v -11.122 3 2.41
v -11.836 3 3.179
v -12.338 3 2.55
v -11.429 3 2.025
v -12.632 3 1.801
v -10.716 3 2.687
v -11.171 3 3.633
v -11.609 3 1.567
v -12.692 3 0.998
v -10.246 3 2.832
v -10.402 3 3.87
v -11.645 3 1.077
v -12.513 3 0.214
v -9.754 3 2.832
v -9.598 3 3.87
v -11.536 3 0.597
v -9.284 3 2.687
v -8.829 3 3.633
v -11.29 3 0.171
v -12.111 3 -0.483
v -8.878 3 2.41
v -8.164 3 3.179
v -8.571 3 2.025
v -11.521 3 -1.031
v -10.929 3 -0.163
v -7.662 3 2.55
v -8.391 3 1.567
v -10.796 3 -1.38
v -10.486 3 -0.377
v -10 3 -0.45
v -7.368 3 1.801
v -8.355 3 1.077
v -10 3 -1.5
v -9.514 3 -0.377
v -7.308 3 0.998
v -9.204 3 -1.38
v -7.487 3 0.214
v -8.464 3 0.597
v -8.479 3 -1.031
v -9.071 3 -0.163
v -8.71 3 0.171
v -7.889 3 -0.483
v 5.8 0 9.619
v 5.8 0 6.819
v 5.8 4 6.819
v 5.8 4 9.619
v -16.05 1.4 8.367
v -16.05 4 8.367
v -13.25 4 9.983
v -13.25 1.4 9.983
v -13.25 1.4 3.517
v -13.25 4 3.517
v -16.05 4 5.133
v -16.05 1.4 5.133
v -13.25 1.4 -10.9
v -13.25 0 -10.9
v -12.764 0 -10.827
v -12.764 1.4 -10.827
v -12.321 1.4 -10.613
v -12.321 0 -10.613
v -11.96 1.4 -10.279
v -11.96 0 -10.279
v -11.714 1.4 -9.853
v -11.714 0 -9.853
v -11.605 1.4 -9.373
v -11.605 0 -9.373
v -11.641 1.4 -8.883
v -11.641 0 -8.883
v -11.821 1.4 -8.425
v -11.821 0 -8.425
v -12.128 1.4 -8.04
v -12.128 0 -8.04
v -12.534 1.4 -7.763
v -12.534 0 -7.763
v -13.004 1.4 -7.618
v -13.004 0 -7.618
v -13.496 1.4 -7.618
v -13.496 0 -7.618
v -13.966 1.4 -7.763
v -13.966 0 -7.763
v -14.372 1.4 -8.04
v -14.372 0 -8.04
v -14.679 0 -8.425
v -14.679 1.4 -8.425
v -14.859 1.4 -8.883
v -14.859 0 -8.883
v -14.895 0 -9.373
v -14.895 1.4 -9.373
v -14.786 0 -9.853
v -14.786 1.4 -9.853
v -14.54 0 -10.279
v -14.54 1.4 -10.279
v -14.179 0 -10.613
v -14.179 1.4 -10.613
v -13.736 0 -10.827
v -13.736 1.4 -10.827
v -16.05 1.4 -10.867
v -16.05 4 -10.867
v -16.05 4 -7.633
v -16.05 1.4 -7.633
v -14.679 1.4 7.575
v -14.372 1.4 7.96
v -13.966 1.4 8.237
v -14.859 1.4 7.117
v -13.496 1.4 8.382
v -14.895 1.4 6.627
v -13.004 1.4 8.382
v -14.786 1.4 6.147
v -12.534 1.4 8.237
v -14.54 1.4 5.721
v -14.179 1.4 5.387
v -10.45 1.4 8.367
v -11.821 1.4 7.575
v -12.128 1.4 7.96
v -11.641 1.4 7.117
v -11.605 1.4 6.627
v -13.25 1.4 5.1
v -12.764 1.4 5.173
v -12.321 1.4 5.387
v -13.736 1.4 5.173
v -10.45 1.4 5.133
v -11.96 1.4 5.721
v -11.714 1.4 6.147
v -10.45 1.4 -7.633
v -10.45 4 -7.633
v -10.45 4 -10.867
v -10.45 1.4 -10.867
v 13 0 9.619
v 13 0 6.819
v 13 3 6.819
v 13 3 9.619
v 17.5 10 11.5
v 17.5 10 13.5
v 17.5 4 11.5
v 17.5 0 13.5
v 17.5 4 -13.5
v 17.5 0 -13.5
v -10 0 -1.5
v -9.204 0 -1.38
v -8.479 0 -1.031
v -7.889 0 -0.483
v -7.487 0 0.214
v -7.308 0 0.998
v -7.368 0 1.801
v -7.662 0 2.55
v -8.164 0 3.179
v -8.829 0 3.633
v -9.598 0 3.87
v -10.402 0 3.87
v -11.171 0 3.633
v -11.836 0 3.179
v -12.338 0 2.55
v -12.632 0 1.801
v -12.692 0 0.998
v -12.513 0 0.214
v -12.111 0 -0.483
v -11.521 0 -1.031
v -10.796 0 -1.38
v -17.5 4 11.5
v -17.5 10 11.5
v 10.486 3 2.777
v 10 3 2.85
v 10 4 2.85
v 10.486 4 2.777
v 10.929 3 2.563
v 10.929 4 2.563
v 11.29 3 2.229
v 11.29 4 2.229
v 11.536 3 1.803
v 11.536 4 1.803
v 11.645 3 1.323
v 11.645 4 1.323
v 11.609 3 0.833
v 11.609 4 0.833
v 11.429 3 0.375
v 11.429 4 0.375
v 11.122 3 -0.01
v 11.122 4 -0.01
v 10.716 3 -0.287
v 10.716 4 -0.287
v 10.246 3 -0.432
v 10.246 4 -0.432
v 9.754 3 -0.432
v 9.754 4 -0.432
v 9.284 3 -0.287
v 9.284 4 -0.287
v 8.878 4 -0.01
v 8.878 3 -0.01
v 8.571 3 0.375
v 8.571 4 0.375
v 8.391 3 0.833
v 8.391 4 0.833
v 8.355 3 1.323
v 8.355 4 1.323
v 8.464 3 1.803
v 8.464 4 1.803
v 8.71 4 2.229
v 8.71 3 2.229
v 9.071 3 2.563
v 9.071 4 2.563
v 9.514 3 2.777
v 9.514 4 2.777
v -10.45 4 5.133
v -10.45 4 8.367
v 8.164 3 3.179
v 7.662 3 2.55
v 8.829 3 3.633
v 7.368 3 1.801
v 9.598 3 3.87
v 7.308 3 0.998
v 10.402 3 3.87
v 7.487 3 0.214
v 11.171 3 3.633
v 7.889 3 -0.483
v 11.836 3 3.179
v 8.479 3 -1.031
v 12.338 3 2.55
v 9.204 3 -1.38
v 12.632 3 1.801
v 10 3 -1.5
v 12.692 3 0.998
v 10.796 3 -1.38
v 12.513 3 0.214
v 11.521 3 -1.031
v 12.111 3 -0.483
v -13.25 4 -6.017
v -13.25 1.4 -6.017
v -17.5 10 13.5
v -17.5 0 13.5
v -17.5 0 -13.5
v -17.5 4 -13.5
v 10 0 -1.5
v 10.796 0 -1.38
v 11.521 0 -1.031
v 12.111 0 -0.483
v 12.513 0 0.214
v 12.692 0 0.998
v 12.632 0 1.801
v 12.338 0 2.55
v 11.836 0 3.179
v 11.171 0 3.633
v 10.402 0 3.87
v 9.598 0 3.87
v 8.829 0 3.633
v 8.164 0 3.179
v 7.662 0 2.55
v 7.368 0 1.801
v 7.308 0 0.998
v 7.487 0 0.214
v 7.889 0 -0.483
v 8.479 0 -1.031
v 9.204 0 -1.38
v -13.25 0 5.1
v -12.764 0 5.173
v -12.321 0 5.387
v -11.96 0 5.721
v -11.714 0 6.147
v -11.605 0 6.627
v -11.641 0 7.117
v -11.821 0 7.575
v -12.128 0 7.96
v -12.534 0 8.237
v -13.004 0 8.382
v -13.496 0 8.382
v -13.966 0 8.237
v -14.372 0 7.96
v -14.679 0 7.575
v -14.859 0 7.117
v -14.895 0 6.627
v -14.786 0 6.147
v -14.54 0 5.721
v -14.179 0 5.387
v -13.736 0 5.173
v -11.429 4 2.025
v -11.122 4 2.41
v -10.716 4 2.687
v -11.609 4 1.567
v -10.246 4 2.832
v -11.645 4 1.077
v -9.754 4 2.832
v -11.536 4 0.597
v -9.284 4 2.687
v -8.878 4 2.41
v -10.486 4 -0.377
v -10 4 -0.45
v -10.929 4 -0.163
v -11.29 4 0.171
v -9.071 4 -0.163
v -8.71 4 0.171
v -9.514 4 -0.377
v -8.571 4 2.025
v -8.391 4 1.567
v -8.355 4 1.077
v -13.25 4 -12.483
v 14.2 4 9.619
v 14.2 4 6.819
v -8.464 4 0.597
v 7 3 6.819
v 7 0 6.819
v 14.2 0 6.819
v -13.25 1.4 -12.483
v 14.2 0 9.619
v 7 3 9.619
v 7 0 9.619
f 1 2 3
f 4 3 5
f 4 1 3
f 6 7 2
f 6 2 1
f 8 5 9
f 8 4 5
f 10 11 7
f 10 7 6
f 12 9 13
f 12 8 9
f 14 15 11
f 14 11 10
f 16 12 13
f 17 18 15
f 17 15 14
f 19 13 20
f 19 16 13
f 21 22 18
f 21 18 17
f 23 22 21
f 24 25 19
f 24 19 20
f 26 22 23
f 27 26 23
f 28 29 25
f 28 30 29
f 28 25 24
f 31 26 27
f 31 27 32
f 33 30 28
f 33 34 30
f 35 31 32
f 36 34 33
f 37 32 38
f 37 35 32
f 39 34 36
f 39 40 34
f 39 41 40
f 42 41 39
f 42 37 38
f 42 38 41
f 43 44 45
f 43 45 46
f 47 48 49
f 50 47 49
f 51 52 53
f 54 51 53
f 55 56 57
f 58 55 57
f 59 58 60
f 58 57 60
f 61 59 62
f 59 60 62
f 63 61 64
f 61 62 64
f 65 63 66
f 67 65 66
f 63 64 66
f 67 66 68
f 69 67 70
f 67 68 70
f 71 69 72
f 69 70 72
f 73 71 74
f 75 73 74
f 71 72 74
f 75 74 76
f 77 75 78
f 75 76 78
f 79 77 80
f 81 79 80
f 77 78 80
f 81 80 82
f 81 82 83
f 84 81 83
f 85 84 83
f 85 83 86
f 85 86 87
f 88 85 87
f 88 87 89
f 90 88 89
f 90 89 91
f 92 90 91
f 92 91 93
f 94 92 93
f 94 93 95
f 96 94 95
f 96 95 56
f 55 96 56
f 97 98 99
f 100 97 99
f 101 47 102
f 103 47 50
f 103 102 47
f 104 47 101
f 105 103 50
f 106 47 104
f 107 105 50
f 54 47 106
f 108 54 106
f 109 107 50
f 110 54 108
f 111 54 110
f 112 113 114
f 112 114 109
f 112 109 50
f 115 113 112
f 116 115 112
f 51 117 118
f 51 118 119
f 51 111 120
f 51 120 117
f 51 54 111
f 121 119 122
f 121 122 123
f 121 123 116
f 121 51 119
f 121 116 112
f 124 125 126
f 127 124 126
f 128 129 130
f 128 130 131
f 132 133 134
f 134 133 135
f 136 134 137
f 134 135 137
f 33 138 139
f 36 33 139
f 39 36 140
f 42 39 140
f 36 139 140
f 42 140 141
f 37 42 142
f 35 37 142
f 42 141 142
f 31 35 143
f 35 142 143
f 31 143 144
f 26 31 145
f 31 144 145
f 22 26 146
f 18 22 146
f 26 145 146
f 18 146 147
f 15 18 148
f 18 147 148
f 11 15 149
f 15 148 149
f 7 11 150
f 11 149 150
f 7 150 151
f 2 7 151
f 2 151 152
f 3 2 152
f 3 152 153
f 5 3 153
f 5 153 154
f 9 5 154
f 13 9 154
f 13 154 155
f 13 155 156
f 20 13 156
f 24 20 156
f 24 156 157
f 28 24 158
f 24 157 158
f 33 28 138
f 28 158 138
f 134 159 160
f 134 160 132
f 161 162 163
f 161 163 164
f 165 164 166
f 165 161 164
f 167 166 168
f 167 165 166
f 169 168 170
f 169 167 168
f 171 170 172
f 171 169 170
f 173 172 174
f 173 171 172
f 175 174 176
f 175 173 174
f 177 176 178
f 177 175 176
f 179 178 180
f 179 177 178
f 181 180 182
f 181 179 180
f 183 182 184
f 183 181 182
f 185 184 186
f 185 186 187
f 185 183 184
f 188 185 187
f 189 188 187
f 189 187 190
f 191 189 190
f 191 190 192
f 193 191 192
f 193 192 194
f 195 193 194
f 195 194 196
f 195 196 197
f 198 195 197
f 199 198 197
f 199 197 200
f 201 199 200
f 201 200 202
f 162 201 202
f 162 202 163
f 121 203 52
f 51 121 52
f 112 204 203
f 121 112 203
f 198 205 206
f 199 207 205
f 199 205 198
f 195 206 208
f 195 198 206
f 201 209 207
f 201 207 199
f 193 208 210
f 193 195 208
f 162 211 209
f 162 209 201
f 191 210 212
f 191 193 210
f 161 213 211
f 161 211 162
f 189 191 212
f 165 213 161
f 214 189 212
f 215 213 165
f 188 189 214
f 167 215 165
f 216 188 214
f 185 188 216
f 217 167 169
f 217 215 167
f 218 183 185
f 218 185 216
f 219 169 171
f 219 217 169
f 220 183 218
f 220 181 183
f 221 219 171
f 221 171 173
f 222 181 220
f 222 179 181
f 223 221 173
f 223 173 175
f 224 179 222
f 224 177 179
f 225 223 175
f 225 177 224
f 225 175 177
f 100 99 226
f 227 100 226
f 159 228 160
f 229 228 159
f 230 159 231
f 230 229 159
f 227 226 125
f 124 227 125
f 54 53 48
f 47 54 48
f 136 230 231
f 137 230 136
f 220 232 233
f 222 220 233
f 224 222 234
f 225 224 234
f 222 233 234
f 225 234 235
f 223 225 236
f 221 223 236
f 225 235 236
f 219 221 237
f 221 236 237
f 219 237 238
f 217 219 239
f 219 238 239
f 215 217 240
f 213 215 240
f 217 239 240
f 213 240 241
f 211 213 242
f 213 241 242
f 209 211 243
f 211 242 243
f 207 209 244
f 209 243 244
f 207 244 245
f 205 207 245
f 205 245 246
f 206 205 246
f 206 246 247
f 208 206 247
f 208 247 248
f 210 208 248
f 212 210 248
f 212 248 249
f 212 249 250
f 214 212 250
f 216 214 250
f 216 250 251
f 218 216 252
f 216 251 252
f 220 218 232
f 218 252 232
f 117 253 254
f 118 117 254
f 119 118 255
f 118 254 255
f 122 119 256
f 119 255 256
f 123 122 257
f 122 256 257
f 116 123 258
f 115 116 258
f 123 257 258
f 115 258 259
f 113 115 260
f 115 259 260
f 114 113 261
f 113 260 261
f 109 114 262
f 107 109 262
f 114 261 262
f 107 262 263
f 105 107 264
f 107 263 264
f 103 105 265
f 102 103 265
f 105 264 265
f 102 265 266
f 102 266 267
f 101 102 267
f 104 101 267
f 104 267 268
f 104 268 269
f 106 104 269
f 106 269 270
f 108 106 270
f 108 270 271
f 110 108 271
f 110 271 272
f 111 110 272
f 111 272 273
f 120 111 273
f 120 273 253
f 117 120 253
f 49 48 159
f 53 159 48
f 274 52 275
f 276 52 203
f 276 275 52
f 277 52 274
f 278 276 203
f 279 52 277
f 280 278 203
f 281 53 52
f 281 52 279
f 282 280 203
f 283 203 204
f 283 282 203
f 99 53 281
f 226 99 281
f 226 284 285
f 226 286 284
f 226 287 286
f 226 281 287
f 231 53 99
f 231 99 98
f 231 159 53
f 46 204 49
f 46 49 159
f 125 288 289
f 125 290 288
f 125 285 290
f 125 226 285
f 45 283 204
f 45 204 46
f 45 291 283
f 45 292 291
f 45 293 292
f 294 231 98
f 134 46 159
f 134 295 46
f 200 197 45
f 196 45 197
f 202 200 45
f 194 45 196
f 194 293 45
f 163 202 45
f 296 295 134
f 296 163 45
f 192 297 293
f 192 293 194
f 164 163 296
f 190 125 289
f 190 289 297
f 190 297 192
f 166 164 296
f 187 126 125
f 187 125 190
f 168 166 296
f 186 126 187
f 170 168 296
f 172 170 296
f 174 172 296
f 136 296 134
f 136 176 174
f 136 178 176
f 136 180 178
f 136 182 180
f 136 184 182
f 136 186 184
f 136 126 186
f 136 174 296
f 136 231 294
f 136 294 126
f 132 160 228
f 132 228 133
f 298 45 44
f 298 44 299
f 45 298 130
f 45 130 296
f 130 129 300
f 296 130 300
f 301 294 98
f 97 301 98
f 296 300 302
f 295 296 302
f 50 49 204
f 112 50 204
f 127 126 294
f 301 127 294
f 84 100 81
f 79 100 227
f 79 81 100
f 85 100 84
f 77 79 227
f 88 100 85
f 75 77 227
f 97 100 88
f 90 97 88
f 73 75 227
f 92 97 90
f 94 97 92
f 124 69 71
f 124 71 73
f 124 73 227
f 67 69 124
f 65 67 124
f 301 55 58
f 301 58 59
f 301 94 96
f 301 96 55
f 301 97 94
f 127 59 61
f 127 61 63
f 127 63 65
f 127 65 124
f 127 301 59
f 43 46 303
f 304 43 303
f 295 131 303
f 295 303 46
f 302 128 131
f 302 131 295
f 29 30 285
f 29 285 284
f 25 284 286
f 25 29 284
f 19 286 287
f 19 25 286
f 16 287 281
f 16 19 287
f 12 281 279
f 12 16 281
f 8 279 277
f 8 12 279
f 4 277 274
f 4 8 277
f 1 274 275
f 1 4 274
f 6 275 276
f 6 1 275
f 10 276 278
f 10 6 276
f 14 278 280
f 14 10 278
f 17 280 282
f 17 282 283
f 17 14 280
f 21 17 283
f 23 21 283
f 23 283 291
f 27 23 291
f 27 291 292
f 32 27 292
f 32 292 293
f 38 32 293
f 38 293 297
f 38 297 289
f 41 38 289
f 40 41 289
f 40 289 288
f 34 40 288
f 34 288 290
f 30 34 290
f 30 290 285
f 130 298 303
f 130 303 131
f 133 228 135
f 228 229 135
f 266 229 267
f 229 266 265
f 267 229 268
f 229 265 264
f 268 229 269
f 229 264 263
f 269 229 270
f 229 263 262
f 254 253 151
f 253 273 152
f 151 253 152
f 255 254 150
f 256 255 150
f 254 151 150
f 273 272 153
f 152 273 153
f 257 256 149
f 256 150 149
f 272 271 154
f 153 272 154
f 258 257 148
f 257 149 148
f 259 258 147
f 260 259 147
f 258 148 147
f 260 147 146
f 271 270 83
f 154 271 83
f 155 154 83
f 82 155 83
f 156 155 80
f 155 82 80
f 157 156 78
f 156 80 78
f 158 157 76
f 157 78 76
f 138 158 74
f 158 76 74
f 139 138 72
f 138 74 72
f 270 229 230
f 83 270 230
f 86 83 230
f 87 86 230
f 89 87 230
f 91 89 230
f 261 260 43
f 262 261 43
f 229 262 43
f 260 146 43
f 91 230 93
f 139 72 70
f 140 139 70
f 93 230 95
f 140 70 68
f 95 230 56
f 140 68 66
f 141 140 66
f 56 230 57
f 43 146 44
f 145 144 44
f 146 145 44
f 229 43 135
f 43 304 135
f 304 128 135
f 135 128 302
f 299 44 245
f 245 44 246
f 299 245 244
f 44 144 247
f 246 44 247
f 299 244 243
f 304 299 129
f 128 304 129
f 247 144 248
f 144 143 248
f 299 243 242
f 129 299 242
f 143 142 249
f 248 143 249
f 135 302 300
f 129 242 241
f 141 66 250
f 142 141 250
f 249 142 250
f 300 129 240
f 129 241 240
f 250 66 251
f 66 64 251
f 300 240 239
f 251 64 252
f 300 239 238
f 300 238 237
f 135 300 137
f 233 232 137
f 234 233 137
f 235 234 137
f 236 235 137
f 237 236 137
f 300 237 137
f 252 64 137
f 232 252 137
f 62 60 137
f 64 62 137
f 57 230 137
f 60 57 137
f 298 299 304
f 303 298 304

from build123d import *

# Parameters (mm, degrees)
SKETCH3_W           = 35
SKETCH3_H           = 27
SKETCH3_R           = 1.65
BOSS_EXTRUDE2_DEPTH = 4
SKETCH5_W           = 35
SKETCH5_H           = 2
BOSS_EXTRUDE3_DEPTH = 6
SKETCH7_R           = 1.65
CUT_EXTRUDE2_DEPTH  = 4
CUT_EXTRUDE3_DEPTH  = 2.6
SKETCH9_R           = 2.7
CUT_EXTRUDE4_DEPTH  = 3
SKETCH10_W          = 1.2
SKETCH10_H          = 2.8
CUT_EXTRUDE5_DEPTH  = 4
SKETCH11_W          = 6
SKETCH11_H          = 2.8
CUT_EXTRUDE6_DEPTH  = 1


with BuildPart() as part:
    # Sketch3 → Boss-Extrude2 (new body)
    with BuildSketch(Plane(origin=(0, 0, 0), x_dir=(1, 0, 0), z_dir=(0, 1, 0))):
        Rectangle(SKETCH3_W, SKETCH3_H)
        with Locations(Location((10, -1.2, 0), (0, 0, 270))):
            Circle(SKETCH3_R, mode=Mode.SUBTRACT)
        with Locations(Location((-10, -1.2, 0), (0, 0, 90))):
            Circle(SKETCH3_R, mode=Mode.SUBTRACT)
    extrude(amount=BOSS_EXTRUDE2_DEPTH)

    # Sketch5 → Boss-Extrude3 (add)
    with BuildSketch(Plane(origin=(0, 4, 0), x_dir=(1, 0, 0), z_dir=(0, 1, 0))):
        with Locations((0, -12.5)):
            Rectangle(SKETCH5_W, SKETCH5_H)
    extrude(amount=BOSS_EXTRUDE3_DEPTH)

    # Sketch7 → Cut-Extrude2 (cut)
    with BuildSketch(Plane.XZ):
        with Locations(Location((-13.25, -9.25, 0), (0, 0, 270))):
            Circle(SKETCH7_R)
        with Locations(Location((-13.25, 6.75, 0), (0, 0, 270))):
            Circle(SKETCH7_R)
    extrude(amount=-CUT_EXTRUDE2_DEPTH, mode=Mode.SUBTRACT)

    # Sketch8 → Cut-Extrude3 (cut)
    with BuildSketch(Plane(origin=(0, 4, 0), x_dir=(1, 0, 0), z_dir=(0, 1, 0))):
        Polygon((-10.45, 7.633419246), (-10.45, 10.866580754), (-13.25, 12.483161507), (-16.05, 10.866580754), (-16.05, 7.633419246), (-13.25, 6.016838493), align=None)
        Polygon((-10.45, -5.133419246), (-13.25, -3.516838493), (-16.05, -5.133419246), (-16.05, -8.366580754), (-13.25, -9.983161507), (-10.45, -8.366580754), align=None)
    extrude(amount=-CUT_EXTRUDE3_DEPTH, mode=Mode.SUBTRACT)

    # Sketch9 → Cut-Extrude4 (cut)
    with BuildSketch(Plane.XZ):
        with Locations(Location((-10, 1.2, 0), (0, 0, 270))):
            Circle(SKETCH9_R)
        with Locations(Location((10, 1.2, 0), (0, 0, 270))):
            Circle(SKETCH9_R)
    extrude(amount=-CUT_EXTRUDE4_DEPTH, mode=Mode.SUBTRACT)

    # Sketch10 → Cut-Extrude5 (cut)
    with BuildSketch(Plane.XZ):
        with Locations((6.4, 8.219052272)):
            Rectangle(SKETCH10_W, SKETCH10_H)
        with Locations((13.6, 8.219052272)):
            Rectangle(SKETCH10_W, SKETCH10_H)
    extrude(amount=-CUT_EXTRUDE5_DEPTH, mode=Mode.SUBTRACT)

    # Sketch11 → Cut-Extrude6 (cut)
    with BuildSketch(Plane(origin=(0, 4, 0), x_dir=(1, 0, 0), z_dir=(0, 1, 0))):
        with Locations((10, -8.219052272)):
            Rectangle(SKETCH11_W, SKETCH11_H)
    extrude(amount=-CUT_EXTRUDE6_DEPTH, mode=Mode.SUBTRACT)


solid = part.part
